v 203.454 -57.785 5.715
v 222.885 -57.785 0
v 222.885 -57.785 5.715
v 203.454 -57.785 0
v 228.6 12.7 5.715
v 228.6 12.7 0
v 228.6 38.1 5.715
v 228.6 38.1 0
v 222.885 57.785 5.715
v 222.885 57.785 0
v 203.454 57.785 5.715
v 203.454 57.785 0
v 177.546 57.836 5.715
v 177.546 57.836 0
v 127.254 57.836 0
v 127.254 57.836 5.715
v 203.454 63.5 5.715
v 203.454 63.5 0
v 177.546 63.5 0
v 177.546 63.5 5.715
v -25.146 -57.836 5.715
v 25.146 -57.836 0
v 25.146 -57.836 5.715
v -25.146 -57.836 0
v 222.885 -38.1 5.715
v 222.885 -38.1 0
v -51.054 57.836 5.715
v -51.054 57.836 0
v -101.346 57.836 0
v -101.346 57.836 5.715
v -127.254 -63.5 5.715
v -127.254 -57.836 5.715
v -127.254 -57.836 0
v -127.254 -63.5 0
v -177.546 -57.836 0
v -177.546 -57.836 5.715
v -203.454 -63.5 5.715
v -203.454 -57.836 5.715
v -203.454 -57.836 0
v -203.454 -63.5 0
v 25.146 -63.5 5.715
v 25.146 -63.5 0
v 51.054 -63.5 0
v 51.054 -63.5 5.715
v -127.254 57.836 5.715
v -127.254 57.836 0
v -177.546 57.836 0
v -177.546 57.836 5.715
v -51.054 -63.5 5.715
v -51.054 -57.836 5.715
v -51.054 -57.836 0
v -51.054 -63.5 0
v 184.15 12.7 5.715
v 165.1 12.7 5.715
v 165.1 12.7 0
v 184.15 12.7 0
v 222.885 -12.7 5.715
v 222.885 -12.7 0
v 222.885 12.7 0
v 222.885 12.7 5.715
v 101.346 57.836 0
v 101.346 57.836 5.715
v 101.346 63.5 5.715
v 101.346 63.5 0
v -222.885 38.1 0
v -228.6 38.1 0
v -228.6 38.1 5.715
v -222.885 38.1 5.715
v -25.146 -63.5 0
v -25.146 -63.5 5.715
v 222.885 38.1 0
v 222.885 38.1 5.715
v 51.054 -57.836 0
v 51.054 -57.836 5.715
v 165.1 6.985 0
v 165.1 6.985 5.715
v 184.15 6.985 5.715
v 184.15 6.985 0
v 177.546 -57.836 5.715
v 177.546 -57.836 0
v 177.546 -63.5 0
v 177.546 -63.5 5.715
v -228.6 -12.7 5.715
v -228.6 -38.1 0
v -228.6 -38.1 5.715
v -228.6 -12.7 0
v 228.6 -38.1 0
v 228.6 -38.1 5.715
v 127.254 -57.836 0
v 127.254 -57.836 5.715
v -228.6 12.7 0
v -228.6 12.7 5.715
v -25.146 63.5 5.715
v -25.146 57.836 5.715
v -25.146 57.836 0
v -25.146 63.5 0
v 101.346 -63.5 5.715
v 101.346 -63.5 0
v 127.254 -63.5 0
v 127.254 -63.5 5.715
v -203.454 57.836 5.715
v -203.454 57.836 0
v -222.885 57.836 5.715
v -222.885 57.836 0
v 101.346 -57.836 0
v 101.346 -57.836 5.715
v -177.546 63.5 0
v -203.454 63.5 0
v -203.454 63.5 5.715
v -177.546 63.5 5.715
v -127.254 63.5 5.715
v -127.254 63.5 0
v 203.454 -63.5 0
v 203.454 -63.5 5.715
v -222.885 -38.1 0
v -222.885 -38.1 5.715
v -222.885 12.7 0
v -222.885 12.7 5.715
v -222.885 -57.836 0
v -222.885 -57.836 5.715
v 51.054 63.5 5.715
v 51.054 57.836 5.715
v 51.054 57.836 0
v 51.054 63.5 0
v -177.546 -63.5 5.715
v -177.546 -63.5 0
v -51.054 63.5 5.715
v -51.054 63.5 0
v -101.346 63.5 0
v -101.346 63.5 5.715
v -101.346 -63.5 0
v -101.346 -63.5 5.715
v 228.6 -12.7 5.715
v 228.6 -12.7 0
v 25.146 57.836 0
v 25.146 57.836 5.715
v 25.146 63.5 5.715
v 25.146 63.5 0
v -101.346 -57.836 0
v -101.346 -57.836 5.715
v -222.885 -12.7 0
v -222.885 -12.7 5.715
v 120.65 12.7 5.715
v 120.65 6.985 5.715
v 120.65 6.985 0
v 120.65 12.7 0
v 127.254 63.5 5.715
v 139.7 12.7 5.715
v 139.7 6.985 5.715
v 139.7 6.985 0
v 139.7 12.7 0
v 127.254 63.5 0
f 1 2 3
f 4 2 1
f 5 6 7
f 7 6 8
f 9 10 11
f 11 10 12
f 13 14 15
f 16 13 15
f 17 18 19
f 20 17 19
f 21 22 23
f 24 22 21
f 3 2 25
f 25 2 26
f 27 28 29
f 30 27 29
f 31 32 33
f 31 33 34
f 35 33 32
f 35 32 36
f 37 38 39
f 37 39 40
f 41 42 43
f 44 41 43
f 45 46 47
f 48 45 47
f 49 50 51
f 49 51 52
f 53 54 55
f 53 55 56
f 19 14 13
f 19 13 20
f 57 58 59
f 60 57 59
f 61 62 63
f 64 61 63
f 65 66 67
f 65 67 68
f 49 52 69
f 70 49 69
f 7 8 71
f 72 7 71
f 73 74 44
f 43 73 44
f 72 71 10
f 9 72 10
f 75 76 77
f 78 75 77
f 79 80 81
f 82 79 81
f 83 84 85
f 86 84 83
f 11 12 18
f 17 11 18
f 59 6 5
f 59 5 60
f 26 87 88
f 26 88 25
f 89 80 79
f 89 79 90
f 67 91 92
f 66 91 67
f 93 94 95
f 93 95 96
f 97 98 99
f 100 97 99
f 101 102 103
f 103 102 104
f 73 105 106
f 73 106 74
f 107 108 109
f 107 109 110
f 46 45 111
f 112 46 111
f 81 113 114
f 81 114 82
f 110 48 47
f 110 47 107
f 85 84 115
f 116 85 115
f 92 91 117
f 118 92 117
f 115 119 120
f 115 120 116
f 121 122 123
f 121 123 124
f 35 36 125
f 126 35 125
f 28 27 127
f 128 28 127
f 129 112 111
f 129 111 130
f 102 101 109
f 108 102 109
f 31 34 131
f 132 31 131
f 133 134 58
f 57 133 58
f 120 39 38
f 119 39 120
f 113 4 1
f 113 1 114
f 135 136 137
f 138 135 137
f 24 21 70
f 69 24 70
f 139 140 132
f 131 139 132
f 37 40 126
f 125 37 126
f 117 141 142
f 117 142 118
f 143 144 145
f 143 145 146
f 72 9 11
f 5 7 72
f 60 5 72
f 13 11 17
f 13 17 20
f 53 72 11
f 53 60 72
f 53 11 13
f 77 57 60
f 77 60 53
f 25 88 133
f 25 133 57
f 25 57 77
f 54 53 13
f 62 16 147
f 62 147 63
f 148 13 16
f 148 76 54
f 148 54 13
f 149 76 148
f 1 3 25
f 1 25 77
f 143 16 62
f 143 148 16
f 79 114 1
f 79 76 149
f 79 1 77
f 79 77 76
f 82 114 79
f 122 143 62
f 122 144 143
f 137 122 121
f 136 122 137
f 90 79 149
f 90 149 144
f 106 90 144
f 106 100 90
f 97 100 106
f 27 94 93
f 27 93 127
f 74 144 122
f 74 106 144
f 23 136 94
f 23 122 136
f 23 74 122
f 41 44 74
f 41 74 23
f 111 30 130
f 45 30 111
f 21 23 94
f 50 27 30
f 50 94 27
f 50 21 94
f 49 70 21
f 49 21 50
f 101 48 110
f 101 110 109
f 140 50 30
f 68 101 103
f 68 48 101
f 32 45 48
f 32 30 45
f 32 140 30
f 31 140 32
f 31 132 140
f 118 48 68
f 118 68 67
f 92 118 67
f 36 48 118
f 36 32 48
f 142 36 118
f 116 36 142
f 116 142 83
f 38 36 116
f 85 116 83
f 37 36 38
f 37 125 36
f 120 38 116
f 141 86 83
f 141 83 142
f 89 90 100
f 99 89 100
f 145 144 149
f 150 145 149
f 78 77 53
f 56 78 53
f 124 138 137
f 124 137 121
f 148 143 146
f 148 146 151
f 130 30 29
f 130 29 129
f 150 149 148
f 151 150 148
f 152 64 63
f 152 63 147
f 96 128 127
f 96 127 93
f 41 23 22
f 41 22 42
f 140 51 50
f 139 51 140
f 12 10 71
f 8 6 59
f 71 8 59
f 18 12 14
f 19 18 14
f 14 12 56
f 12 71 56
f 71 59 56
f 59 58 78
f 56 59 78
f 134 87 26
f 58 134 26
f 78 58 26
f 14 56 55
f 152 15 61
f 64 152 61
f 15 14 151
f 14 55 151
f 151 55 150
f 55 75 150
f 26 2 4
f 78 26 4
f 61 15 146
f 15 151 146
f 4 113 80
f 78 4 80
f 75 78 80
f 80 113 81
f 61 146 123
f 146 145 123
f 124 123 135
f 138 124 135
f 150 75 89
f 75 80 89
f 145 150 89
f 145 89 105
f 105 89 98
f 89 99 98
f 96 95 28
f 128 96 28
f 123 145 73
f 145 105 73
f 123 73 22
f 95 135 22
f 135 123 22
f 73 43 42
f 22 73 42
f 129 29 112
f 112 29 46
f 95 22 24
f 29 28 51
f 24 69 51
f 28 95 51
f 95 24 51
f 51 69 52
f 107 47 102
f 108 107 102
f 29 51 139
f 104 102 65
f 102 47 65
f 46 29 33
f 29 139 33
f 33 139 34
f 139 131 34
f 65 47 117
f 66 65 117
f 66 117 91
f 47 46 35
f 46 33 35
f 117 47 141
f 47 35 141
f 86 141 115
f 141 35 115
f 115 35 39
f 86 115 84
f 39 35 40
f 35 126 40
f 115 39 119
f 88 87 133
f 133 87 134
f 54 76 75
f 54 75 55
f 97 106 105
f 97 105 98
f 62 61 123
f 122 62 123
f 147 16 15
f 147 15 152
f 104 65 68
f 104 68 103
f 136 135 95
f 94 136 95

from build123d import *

# Parameters (mm, degrees)
SKETCH1_W             = 457.2
SKETCH1_H             = 127
BOSS_EXTRUDE1_DEPTH   = 5.715
SKETCH2_W             = 19.05
SKETCH2_H             = 5.715
LED_MOUNT_HOLES_DEPTH = 6.715
SKETCH4_W             = 5.715
SKETCH4_H             = 25.4
CUT_EXTRUDE2_DEPTH    = 6.715
SKETCH5_W             = 50.8
SKETCH5_H             = 5.6642
SKETCH5_W_2           = 25.4
SKETCH5_H_2           = 5.715
CUT_EXTRUDE3_DEPTH    = 6.715
SKETCH6_W             = 0.254
SKETCH6_H             = 5.715
SKETCH6_H_2           = 5.6642
BOSS_EXTRUDE2_DEPTH   = 5.715


with BuildPart() as part:
    # Sketch1 → Boss-Extrude1 (new body)
    with BuildSketch(Plane.XY):
        Rectangle(SKETCH1_W, SKETCH1_H)
    extrude(amount=BOSS_EXTRUDE1_DEPTH)

    # Sketch2 → LED Mount Holes (cut, through all)
    with BuildSketch(Plane.XY.offset(5.715)):
        with Locations((174.625, 9.8425)):
            Rectangle(SKETCH2_W, SKETCH2_H)
        with Locations((130.175, 9.8425)):
            Rectangle(SKETCH2_W, SKETCH2_H)
    extrude(amount=-LED_MOUNT_HOLES_DEPTH, mode=Mode.SUBTRACT)

    # Sketch4 → Cut-Extrude2 (cut, through all)
    with BuildSketch(Plane(origin=(0, 0, 0), x_dir=(-1, 0, 0), z_dir=(0, 0, -1))):
        with Locations((-225.7425, 50.8)):
            Rectangle(SKETCH4_W, SKETCH4_H)
        with Locations((-225.7425, 0)):
            Rectangle(SKETCH4_W, SKETCH4_H)
        with Locations((-225.7425, -50.8)):
            Rectangle(SKETCH4_W, SKETCH4_H)
    cut_extrude2 = extrude(amount=-CUT_EXTRUDE2_DEPTH, mode=Mode.SUBTRACT)

    # Mirror1: Cut-Extrude2 across plane
    add(cut_extrude2.mirror(Plane(origin=(0, 0, 0), x_dir=(0, 0, 1), z_dir=(1, 0, 0))), mode=Mode.SUBTRACT)

    # Sketch5 → Cut-Extrude3 (cut, through all)
    with BuildSketch(Plane(origin=(0, 0, 0), x_dir=(-1, 0, 0), z_dir=(0, 0, -1))):
        with Locations((-152.4, 60.6679)):
            Rectangle(SKETCH5_W, SKETCH5_H)
        with Locations((-76.2, 60.6679)):
            Rectangle(SKETCH5_W, SKETCH5_H)
        with Locations((0, 60.6679)):
            Rectangle(SKETCH5_W, SKETCH5_H)
        with Locations((76.2, 60.6679)):
            Rectangle(SKETCH5_W, SKETCH5_H)
        with Locations((152.4, 60.6679)):
            Rectangle(SKETCH5_W, SKETCH5_H)
        with Locations((228.6, 60.6679)):
            Rectangle(SKETCH5_W, SKETCH5_H)
        with Locations((-215.9, 60.6425)):
            Rectangle(SKETCH5_W_2, SKETCH5_H_2)
    cut_extrude3 = extrude(amount=-CUT_EXTRUDE3_DEPTH, mode=Mode.SUBTRACT)

    # Sketch6 → Boss-Extrude2 (add)
    with BuildSketch(Plane(origin=(0, 0, 0), x_dir=(-1, 0, 0), z_dir=(0, 0, -1))):
        with Locations((-203.327, 60.6425)):
            Rectangle(SKETCH6_W, SKETCH6_H)
        with Locations((-177.673, 60.6425)):
            Rectangle(SKETCH6_W, SKETCH6_H)
        with Locations((-127.127, 60.6679)):
            Rectangle(SKETCH6_W, SKETCH6_H_2)
        with Locations((-101.473, 60.6679)):
            Rectangle(SKETCH6_W, SKETCH6_H_2)
        with Locations((-50.927, 60.6679)):
            Rectangle(SKETCH6_W, SKETCH6_H_2)
        with Locations((-25.273, 60.6679)):
            Rectangle(SKETCH6_W, SKETCH6_H_2)
        with Locations((25.273, 60.6679)):
            Rectangle(SKETCH6_W, SKETCH6_H_2)
        with Locations((50.927, 60.6679)):
            Rectangle(SKETCH6_W, SKETCH6_H_2)
        with Locations((101.473, 60.6679)):
            Rectangle(SKETCH6_W, SKETCH6_H_2)
        with Locations((127.127, 60.6679)):
            Rectangle(SKETCH6_W, SKETCH6_H_2)
        with Locations((177.673, 60.6679)):
            Rectangle(SKETCH6_W, SKETCH6_H_2)
        with Locations((203.327, 60.6679)):
            Rectangle(SKETCH6_W, SKETCH6_H_2)
    boss_extrude2 = extrude(amount=-BOSS_EXTRUDE2_DEPTH)

    # Mirror2: Cut-Extrude3, Boss-Extrude2 across plane
    add(cut_extrude3.mirror(Plane.ZX), mode=Mode.SUBTRACT)
    add(boss_extrude2.mirror(Plane.ZX))


solid = part.part
